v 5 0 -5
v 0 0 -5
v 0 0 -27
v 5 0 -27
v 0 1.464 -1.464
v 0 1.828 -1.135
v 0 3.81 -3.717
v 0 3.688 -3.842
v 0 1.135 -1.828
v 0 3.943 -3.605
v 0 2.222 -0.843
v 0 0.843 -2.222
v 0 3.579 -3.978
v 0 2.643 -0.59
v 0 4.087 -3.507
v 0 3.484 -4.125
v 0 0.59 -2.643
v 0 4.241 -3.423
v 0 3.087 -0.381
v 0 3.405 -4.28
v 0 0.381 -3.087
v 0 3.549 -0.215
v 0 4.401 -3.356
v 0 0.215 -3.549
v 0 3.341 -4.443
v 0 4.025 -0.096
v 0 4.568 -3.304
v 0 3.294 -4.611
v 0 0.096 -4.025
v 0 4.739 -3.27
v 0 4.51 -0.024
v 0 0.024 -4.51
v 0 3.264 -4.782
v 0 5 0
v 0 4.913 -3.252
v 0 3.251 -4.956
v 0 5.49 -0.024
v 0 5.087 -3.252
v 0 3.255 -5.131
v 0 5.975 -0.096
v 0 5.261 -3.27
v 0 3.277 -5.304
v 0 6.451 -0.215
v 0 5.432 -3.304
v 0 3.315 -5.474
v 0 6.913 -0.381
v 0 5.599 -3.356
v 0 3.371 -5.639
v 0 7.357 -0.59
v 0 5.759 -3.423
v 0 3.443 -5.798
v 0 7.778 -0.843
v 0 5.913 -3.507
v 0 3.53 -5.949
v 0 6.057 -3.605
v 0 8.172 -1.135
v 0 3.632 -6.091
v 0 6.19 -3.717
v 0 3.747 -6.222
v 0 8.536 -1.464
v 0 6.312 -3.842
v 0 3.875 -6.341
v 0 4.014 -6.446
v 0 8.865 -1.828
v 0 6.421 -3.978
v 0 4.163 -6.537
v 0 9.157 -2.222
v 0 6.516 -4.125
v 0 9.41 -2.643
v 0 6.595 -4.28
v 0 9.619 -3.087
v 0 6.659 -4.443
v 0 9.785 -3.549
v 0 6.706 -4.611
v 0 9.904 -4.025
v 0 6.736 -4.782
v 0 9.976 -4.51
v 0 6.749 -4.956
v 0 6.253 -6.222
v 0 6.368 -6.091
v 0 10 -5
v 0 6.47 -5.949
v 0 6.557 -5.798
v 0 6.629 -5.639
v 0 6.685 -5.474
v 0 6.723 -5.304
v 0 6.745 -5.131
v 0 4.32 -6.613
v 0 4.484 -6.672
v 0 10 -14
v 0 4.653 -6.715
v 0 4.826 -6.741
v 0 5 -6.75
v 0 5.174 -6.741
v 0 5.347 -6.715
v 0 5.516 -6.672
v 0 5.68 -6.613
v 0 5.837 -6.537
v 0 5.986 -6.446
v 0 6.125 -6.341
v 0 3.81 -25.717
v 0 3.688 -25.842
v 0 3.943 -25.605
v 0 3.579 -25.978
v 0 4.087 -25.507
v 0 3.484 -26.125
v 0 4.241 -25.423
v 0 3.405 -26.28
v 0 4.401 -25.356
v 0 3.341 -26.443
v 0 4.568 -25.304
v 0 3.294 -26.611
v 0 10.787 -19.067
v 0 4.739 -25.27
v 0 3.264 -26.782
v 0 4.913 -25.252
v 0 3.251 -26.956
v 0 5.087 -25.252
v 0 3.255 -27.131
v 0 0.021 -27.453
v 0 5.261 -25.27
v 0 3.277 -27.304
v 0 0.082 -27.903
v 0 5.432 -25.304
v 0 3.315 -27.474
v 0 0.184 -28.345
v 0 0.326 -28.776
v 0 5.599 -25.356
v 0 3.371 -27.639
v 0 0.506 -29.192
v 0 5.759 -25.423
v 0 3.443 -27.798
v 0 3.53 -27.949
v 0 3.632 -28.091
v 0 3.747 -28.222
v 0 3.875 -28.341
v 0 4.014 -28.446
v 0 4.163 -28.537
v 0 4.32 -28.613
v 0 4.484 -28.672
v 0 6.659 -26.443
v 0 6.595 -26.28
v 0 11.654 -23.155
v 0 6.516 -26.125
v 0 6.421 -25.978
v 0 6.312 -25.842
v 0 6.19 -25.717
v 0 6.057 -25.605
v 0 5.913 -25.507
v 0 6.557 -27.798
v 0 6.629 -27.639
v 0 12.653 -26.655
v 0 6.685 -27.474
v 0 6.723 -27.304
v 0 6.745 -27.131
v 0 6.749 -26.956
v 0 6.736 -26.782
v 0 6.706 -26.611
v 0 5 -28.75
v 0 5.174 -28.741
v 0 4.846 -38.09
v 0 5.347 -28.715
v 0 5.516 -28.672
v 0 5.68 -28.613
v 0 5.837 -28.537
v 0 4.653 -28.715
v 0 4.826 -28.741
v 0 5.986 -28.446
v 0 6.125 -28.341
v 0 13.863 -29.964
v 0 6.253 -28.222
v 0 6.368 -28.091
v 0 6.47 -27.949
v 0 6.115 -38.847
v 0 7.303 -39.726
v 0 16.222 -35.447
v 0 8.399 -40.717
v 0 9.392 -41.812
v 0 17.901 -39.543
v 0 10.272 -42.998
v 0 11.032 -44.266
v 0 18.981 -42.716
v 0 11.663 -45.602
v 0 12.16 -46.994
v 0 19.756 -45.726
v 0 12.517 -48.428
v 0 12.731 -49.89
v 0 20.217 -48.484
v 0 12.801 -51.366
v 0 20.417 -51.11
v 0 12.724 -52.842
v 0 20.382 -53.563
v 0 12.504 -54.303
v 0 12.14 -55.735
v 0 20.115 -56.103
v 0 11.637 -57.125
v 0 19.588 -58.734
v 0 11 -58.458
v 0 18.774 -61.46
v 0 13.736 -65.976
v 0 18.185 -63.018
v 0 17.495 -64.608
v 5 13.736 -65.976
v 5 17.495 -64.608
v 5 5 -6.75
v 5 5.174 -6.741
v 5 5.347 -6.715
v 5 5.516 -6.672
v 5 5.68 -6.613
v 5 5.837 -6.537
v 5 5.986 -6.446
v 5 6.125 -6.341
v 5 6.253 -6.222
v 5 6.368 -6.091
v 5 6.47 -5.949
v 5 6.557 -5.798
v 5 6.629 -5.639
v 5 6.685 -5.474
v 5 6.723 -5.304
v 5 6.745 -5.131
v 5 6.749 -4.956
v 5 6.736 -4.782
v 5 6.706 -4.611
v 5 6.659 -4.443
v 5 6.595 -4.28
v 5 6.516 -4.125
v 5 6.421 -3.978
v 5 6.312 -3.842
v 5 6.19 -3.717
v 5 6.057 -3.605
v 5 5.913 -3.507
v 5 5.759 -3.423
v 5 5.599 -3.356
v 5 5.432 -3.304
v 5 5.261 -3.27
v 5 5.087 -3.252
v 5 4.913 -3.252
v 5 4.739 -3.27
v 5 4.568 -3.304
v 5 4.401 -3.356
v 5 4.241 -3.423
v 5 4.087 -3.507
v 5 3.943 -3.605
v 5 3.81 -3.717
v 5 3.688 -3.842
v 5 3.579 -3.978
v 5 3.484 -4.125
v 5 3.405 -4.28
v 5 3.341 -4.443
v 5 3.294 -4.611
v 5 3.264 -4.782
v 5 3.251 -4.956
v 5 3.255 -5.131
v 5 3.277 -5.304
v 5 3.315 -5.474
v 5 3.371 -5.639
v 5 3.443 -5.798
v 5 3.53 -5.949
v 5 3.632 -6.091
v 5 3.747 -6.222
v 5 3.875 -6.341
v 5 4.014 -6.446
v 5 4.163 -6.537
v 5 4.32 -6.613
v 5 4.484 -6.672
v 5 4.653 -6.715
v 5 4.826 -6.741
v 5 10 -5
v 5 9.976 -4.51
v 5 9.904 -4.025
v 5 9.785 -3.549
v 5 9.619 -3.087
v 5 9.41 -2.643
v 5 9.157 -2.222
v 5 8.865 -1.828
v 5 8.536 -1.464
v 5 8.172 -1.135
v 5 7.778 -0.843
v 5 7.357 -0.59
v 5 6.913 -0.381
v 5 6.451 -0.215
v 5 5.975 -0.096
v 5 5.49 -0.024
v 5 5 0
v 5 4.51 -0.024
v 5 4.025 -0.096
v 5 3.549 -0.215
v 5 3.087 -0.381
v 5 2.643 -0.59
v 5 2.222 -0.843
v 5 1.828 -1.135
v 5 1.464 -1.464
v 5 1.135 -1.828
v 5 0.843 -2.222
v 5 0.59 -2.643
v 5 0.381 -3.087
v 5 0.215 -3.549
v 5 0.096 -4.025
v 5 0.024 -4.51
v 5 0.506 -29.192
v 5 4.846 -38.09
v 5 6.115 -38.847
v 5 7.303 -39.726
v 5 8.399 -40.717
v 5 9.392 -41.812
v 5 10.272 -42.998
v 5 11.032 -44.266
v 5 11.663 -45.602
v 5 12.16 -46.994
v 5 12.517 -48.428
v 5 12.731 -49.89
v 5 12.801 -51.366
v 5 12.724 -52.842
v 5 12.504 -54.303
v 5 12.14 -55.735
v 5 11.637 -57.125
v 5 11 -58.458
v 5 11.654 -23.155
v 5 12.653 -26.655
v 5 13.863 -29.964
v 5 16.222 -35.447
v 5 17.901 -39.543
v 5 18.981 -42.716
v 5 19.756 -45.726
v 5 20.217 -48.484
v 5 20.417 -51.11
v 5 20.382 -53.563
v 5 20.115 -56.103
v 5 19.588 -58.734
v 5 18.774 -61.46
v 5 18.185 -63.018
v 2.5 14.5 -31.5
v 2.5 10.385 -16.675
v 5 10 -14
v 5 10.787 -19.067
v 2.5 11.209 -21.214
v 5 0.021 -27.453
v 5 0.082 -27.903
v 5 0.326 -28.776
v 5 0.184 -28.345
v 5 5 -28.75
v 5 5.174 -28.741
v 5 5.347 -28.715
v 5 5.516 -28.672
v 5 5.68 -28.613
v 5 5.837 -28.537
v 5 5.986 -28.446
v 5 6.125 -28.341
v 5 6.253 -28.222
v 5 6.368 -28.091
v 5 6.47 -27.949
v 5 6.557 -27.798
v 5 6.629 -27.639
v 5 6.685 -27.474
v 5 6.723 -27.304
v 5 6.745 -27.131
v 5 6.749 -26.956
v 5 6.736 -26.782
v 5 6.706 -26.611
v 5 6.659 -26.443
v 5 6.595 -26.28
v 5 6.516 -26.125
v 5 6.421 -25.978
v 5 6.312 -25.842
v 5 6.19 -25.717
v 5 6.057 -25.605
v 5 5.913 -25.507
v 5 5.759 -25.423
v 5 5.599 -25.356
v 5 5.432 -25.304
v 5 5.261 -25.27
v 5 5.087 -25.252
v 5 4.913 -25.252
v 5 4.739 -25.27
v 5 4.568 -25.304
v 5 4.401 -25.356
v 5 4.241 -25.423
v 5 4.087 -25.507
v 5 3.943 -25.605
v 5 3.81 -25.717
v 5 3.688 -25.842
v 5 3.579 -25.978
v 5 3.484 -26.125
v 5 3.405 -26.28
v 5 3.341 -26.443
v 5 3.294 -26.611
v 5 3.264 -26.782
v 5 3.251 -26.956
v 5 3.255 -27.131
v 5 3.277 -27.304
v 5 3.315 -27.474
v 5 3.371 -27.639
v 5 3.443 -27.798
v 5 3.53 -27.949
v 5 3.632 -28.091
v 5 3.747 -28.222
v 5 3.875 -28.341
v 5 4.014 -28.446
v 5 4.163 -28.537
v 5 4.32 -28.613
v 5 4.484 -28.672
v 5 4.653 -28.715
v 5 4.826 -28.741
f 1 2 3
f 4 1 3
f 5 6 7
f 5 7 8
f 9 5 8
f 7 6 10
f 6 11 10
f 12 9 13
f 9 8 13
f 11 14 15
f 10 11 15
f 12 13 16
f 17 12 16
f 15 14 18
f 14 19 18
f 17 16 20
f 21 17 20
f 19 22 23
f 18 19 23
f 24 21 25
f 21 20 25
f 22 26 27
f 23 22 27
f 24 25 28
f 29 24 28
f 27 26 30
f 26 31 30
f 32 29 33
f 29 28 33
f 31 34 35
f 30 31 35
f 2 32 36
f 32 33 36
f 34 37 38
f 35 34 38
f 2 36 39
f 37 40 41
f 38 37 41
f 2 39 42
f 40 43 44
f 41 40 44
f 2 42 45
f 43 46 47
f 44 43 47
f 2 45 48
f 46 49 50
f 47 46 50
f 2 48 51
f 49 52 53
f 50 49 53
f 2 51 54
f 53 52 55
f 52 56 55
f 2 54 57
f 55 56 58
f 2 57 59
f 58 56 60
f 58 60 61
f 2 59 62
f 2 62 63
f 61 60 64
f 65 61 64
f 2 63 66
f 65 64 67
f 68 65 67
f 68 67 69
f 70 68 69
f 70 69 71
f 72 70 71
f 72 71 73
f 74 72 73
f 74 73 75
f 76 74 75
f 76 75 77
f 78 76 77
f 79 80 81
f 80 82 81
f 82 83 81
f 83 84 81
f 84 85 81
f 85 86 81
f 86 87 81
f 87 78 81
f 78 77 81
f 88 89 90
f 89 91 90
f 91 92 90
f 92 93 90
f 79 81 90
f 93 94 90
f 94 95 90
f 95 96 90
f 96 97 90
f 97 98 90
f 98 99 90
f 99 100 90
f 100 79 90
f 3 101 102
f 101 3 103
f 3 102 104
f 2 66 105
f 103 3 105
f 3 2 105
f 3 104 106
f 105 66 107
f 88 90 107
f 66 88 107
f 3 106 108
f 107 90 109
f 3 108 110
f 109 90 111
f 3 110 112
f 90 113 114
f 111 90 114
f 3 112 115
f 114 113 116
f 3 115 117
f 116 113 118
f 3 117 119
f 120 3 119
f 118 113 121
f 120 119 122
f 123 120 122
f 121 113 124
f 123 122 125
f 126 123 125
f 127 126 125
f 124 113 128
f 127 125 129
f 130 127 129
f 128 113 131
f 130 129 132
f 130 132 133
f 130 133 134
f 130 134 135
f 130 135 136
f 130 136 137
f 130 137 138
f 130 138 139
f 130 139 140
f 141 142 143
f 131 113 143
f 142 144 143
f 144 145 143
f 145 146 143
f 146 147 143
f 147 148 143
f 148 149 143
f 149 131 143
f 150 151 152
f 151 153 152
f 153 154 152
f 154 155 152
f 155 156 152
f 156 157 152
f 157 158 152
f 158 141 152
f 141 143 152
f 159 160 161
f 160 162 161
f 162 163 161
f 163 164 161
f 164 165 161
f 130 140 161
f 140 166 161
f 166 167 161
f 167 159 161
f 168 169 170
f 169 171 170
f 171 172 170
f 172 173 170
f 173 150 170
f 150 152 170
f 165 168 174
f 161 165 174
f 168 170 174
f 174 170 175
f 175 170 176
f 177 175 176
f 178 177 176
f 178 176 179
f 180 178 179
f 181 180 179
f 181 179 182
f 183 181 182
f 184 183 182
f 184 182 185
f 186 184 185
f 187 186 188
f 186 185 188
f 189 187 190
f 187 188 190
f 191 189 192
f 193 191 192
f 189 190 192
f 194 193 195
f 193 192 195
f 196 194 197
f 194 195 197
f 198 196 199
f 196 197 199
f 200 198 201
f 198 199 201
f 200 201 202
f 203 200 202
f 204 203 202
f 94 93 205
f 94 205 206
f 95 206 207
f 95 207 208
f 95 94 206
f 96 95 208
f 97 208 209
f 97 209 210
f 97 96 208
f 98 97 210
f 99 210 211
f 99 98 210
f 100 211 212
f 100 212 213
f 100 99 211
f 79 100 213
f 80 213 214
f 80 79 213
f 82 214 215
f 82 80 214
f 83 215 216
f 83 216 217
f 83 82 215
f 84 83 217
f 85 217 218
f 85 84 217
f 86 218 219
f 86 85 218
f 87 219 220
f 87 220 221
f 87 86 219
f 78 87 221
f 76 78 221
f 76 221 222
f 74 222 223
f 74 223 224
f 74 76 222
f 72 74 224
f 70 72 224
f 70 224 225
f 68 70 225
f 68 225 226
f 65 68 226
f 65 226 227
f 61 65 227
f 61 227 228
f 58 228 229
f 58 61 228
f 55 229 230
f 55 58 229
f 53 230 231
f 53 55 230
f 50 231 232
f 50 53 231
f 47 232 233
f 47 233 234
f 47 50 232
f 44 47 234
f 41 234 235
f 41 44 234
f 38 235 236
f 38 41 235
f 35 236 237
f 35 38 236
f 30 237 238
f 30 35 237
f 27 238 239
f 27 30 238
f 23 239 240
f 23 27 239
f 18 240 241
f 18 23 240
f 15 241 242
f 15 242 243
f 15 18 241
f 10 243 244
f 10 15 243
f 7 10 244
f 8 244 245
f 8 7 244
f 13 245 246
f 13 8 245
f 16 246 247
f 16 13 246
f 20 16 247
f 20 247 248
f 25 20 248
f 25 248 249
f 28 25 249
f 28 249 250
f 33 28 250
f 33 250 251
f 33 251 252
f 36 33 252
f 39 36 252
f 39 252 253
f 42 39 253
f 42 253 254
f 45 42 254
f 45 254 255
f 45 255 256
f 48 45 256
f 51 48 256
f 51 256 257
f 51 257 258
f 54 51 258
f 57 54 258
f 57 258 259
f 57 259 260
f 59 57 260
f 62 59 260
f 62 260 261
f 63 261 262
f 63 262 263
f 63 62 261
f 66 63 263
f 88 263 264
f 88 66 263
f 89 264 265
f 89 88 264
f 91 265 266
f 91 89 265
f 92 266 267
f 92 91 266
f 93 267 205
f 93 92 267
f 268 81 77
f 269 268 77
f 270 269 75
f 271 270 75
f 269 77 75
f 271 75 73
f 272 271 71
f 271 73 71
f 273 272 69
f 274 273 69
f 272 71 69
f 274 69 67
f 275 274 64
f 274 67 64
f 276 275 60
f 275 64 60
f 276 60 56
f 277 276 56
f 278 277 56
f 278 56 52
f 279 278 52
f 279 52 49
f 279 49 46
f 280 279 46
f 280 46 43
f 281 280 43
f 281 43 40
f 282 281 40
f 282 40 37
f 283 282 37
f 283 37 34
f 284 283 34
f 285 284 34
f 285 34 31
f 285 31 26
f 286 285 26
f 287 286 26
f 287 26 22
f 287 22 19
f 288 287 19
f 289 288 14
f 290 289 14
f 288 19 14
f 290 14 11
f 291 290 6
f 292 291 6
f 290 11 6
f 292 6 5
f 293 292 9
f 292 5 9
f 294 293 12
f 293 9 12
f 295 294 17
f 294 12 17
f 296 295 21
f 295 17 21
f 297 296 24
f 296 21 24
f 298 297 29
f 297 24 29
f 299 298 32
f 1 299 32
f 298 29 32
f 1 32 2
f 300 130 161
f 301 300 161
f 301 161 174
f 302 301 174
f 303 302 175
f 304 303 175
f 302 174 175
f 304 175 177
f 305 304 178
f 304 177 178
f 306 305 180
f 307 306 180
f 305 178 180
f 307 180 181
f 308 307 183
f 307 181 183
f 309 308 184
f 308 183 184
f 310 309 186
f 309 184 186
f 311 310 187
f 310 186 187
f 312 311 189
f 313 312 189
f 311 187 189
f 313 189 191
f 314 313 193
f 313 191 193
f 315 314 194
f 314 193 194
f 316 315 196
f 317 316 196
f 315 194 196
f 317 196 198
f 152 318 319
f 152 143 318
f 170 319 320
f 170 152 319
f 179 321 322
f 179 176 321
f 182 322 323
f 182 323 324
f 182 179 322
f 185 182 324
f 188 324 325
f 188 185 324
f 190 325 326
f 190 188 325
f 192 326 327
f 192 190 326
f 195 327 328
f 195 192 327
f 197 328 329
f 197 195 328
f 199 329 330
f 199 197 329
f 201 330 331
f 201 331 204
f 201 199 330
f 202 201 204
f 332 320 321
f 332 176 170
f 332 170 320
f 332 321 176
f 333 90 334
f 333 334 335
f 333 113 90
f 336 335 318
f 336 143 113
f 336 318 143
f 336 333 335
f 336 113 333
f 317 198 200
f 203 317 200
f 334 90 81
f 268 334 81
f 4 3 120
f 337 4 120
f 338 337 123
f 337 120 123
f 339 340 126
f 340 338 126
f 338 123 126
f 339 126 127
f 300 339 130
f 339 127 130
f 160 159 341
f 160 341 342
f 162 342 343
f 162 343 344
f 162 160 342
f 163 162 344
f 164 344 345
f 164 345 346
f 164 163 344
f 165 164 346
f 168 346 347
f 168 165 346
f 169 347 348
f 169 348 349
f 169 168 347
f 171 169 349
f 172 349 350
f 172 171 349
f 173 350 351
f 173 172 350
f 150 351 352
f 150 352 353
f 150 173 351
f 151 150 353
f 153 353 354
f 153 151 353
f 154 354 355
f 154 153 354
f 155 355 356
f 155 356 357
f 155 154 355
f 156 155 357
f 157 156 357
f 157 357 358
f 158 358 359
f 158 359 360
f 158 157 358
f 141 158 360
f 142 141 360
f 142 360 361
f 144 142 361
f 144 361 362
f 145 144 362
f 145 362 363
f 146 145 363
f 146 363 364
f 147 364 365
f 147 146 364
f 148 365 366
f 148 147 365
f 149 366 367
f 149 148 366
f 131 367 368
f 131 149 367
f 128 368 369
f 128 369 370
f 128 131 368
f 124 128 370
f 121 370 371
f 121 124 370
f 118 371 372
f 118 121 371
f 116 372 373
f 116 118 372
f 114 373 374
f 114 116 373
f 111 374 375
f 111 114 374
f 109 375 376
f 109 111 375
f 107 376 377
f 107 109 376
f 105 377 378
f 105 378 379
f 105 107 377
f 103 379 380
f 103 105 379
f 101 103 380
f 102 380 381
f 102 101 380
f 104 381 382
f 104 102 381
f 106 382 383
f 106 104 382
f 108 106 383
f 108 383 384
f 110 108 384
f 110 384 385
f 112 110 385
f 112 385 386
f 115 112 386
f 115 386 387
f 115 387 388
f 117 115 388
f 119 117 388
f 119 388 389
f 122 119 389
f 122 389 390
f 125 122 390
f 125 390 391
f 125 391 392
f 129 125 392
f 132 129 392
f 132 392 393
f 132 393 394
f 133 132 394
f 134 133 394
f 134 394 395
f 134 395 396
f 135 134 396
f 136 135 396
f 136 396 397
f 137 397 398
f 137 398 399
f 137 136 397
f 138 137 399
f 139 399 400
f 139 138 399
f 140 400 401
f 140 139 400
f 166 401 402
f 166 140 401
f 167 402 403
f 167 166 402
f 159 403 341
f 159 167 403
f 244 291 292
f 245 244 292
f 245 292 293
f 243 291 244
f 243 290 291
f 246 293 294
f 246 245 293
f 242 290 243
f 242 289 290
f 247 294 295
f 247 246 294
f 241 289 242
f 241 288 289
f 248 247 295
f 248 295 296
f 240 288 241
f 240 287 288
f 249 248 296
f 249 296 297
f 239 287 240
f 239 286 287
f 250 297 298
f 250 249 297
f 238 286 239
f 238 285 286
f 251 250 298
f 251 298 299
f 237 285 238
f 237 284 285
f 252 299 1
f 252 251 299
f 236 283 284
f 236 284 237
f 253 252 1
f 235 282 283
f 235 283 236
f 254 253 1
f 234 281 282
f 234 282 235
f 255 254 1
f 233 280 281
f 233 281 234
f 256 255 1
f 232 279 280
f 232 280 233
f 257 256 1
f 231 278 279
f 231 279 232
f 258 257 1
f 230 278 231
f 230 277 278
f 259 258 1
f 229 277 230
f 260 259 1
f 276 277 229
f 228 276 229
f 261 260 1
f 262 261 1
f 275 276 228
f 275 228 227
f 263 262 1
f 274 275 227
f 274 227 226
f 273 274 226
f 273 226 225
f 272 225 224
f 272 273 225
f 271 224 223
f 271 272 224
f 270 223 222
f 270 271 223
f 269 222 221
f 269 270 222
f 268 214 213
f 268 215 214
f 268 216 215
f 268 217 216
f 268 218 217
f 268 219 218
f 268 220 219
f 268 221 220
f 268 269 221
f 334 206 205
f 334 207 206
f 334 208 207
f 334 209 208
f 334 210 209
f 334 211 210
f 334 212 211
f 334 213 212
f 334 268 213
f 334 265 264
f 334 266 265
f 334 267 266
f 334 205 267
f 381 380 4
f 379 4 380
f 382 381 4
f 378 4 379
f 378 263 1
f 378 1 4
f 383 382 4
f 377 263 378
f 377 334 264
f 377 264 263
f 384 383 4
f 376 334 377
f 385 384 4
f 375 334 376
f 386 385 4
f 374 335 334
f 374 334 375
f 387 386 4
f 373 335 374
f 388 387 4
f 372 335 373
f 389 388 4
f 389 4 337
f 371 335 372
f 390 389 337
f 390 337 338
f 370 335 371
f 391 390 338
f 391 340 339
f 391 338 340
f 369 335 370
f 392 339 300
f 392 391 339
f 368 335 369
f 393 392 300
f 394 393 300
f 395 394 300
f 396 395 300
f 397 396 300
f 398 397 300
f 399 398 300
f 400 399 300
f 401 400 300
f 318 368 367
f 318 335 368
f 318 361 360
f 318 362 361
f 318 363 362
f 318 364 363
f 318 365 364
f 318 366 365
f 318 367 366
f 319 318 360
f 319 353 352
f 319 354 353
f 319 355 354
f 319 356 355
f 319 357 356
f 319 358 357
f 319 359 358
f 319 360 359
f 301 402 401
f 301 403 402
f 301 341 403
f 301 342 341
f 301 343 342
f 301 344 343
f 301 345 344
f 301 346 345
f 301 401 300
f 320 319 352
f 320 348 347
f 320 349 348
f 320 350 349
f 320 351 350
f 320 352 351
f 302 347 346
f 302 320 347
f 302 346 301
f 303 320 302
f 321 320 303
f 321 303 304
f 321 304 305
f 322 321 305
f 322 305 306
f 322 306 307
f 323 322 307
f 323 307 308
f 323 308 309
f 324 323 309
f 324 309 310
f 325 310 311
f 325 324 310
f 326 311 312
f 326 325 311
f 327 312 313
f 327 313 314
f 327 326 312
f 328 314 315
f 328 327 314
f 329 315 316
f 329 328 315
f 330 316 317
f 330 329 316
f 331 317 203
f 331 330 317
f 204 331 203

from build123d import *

# Parameters (mm, degrees)
SKETCH1_R           = 5
SKETCH1_R_2         = 1.75
BOSS_EXTRUDE1_DEPTH = 5
BOSS_EXTRUDE2_START = -5
BOSS_EXTRUDE2_DEPTH = 5


with BuildPart() as part:
    # Sketch1 → Boss-Extrude1 (new body)
    # profile 1 of 3: a face of its own
    with BuildSketch(Plane(origin=(0, 0, 0), x_dir=(0, 0, -1), z_dir=(1, 0, 0))):
        with Locations((5, 5)):
            Circle(SKETCH1_R)
        with Locations((5, 5)):
            Circle(SKETCH1_R_2, mode=Mode.SUBTRACT)
    # profile 2 of 3: a face of its own
    with BuildSketch(Plane(origin=(0, 0, 0), x_dir=(0, 0, -1), z_dir=(1, 0, 0))):
        with BuildLine():
            Line((27, 10), (5, 10))
            ThreePointArc((5, 10), (8.535533906, 8.535533906), (10, 5))
            ThreePointArc((10, 5), (8.535533906, 1.464466094), (5, 0))
            Line((5, 0), (27, 0))
            ThreePointArc((27, 0), (22, 5), (27, 10))
        make_face()
    # profile 3 of 3: a face of its own
    with BuildSketch(Plane(origin=(0, 0, 0), x_dir=(0, 0, -1), z_dir=(1, 0, 0))):
        with Locations((27, 5)):
            Circle(SKETCH1_R)
        with Locations((27, 5)):
            Circle(SKETCH1_R_2, mode=Mode.SUBTRACT)
    extrude(amount=BOSS_EXTRUDE1_DEPTH)

    # Sketch2 → Boss-Extrude2 (add)
    with BuildSketch(Plane(origin=(5, 0, 0), x_dir=(0, 0, -1), z_dir=(1, 0, 0)).offset(BOSS_EXTRUDE2_START)):
        with BuildLine():
            Line((65.975697465, 13.736161147), (64.607616892, 17.49493163))
            add(Edge.make_bspline(
                [(14, 10), (22.729658928, 11.165748207), (34.565066024, 15.059942726), (50.556554523, 24.001893285), (64.607616892, 17.49493163)],
                knots=[0, 0, 0, 0, 0.349113353, 1, 1, 1, 1], degree=3))
            Line((14, 10), (27, 10))
            ThreePointArc((27, 10), (31.871850324, 6.124755272), (29.191855734, 0.506029769))
            Line((29.191855734, 0.506029769), (38.089916792, 4.845904122))
            ThreePointArc((38.089916792, 4.845904122), (46.993994408, 12.1595138), (58.458156499, 11))
            Line((58.458156499, 11), (65.975697465, 13.736161147))
        make_face()
    extrude(amount=BOSS_EXTRUDE2_DEPTH)


solid = part.part
